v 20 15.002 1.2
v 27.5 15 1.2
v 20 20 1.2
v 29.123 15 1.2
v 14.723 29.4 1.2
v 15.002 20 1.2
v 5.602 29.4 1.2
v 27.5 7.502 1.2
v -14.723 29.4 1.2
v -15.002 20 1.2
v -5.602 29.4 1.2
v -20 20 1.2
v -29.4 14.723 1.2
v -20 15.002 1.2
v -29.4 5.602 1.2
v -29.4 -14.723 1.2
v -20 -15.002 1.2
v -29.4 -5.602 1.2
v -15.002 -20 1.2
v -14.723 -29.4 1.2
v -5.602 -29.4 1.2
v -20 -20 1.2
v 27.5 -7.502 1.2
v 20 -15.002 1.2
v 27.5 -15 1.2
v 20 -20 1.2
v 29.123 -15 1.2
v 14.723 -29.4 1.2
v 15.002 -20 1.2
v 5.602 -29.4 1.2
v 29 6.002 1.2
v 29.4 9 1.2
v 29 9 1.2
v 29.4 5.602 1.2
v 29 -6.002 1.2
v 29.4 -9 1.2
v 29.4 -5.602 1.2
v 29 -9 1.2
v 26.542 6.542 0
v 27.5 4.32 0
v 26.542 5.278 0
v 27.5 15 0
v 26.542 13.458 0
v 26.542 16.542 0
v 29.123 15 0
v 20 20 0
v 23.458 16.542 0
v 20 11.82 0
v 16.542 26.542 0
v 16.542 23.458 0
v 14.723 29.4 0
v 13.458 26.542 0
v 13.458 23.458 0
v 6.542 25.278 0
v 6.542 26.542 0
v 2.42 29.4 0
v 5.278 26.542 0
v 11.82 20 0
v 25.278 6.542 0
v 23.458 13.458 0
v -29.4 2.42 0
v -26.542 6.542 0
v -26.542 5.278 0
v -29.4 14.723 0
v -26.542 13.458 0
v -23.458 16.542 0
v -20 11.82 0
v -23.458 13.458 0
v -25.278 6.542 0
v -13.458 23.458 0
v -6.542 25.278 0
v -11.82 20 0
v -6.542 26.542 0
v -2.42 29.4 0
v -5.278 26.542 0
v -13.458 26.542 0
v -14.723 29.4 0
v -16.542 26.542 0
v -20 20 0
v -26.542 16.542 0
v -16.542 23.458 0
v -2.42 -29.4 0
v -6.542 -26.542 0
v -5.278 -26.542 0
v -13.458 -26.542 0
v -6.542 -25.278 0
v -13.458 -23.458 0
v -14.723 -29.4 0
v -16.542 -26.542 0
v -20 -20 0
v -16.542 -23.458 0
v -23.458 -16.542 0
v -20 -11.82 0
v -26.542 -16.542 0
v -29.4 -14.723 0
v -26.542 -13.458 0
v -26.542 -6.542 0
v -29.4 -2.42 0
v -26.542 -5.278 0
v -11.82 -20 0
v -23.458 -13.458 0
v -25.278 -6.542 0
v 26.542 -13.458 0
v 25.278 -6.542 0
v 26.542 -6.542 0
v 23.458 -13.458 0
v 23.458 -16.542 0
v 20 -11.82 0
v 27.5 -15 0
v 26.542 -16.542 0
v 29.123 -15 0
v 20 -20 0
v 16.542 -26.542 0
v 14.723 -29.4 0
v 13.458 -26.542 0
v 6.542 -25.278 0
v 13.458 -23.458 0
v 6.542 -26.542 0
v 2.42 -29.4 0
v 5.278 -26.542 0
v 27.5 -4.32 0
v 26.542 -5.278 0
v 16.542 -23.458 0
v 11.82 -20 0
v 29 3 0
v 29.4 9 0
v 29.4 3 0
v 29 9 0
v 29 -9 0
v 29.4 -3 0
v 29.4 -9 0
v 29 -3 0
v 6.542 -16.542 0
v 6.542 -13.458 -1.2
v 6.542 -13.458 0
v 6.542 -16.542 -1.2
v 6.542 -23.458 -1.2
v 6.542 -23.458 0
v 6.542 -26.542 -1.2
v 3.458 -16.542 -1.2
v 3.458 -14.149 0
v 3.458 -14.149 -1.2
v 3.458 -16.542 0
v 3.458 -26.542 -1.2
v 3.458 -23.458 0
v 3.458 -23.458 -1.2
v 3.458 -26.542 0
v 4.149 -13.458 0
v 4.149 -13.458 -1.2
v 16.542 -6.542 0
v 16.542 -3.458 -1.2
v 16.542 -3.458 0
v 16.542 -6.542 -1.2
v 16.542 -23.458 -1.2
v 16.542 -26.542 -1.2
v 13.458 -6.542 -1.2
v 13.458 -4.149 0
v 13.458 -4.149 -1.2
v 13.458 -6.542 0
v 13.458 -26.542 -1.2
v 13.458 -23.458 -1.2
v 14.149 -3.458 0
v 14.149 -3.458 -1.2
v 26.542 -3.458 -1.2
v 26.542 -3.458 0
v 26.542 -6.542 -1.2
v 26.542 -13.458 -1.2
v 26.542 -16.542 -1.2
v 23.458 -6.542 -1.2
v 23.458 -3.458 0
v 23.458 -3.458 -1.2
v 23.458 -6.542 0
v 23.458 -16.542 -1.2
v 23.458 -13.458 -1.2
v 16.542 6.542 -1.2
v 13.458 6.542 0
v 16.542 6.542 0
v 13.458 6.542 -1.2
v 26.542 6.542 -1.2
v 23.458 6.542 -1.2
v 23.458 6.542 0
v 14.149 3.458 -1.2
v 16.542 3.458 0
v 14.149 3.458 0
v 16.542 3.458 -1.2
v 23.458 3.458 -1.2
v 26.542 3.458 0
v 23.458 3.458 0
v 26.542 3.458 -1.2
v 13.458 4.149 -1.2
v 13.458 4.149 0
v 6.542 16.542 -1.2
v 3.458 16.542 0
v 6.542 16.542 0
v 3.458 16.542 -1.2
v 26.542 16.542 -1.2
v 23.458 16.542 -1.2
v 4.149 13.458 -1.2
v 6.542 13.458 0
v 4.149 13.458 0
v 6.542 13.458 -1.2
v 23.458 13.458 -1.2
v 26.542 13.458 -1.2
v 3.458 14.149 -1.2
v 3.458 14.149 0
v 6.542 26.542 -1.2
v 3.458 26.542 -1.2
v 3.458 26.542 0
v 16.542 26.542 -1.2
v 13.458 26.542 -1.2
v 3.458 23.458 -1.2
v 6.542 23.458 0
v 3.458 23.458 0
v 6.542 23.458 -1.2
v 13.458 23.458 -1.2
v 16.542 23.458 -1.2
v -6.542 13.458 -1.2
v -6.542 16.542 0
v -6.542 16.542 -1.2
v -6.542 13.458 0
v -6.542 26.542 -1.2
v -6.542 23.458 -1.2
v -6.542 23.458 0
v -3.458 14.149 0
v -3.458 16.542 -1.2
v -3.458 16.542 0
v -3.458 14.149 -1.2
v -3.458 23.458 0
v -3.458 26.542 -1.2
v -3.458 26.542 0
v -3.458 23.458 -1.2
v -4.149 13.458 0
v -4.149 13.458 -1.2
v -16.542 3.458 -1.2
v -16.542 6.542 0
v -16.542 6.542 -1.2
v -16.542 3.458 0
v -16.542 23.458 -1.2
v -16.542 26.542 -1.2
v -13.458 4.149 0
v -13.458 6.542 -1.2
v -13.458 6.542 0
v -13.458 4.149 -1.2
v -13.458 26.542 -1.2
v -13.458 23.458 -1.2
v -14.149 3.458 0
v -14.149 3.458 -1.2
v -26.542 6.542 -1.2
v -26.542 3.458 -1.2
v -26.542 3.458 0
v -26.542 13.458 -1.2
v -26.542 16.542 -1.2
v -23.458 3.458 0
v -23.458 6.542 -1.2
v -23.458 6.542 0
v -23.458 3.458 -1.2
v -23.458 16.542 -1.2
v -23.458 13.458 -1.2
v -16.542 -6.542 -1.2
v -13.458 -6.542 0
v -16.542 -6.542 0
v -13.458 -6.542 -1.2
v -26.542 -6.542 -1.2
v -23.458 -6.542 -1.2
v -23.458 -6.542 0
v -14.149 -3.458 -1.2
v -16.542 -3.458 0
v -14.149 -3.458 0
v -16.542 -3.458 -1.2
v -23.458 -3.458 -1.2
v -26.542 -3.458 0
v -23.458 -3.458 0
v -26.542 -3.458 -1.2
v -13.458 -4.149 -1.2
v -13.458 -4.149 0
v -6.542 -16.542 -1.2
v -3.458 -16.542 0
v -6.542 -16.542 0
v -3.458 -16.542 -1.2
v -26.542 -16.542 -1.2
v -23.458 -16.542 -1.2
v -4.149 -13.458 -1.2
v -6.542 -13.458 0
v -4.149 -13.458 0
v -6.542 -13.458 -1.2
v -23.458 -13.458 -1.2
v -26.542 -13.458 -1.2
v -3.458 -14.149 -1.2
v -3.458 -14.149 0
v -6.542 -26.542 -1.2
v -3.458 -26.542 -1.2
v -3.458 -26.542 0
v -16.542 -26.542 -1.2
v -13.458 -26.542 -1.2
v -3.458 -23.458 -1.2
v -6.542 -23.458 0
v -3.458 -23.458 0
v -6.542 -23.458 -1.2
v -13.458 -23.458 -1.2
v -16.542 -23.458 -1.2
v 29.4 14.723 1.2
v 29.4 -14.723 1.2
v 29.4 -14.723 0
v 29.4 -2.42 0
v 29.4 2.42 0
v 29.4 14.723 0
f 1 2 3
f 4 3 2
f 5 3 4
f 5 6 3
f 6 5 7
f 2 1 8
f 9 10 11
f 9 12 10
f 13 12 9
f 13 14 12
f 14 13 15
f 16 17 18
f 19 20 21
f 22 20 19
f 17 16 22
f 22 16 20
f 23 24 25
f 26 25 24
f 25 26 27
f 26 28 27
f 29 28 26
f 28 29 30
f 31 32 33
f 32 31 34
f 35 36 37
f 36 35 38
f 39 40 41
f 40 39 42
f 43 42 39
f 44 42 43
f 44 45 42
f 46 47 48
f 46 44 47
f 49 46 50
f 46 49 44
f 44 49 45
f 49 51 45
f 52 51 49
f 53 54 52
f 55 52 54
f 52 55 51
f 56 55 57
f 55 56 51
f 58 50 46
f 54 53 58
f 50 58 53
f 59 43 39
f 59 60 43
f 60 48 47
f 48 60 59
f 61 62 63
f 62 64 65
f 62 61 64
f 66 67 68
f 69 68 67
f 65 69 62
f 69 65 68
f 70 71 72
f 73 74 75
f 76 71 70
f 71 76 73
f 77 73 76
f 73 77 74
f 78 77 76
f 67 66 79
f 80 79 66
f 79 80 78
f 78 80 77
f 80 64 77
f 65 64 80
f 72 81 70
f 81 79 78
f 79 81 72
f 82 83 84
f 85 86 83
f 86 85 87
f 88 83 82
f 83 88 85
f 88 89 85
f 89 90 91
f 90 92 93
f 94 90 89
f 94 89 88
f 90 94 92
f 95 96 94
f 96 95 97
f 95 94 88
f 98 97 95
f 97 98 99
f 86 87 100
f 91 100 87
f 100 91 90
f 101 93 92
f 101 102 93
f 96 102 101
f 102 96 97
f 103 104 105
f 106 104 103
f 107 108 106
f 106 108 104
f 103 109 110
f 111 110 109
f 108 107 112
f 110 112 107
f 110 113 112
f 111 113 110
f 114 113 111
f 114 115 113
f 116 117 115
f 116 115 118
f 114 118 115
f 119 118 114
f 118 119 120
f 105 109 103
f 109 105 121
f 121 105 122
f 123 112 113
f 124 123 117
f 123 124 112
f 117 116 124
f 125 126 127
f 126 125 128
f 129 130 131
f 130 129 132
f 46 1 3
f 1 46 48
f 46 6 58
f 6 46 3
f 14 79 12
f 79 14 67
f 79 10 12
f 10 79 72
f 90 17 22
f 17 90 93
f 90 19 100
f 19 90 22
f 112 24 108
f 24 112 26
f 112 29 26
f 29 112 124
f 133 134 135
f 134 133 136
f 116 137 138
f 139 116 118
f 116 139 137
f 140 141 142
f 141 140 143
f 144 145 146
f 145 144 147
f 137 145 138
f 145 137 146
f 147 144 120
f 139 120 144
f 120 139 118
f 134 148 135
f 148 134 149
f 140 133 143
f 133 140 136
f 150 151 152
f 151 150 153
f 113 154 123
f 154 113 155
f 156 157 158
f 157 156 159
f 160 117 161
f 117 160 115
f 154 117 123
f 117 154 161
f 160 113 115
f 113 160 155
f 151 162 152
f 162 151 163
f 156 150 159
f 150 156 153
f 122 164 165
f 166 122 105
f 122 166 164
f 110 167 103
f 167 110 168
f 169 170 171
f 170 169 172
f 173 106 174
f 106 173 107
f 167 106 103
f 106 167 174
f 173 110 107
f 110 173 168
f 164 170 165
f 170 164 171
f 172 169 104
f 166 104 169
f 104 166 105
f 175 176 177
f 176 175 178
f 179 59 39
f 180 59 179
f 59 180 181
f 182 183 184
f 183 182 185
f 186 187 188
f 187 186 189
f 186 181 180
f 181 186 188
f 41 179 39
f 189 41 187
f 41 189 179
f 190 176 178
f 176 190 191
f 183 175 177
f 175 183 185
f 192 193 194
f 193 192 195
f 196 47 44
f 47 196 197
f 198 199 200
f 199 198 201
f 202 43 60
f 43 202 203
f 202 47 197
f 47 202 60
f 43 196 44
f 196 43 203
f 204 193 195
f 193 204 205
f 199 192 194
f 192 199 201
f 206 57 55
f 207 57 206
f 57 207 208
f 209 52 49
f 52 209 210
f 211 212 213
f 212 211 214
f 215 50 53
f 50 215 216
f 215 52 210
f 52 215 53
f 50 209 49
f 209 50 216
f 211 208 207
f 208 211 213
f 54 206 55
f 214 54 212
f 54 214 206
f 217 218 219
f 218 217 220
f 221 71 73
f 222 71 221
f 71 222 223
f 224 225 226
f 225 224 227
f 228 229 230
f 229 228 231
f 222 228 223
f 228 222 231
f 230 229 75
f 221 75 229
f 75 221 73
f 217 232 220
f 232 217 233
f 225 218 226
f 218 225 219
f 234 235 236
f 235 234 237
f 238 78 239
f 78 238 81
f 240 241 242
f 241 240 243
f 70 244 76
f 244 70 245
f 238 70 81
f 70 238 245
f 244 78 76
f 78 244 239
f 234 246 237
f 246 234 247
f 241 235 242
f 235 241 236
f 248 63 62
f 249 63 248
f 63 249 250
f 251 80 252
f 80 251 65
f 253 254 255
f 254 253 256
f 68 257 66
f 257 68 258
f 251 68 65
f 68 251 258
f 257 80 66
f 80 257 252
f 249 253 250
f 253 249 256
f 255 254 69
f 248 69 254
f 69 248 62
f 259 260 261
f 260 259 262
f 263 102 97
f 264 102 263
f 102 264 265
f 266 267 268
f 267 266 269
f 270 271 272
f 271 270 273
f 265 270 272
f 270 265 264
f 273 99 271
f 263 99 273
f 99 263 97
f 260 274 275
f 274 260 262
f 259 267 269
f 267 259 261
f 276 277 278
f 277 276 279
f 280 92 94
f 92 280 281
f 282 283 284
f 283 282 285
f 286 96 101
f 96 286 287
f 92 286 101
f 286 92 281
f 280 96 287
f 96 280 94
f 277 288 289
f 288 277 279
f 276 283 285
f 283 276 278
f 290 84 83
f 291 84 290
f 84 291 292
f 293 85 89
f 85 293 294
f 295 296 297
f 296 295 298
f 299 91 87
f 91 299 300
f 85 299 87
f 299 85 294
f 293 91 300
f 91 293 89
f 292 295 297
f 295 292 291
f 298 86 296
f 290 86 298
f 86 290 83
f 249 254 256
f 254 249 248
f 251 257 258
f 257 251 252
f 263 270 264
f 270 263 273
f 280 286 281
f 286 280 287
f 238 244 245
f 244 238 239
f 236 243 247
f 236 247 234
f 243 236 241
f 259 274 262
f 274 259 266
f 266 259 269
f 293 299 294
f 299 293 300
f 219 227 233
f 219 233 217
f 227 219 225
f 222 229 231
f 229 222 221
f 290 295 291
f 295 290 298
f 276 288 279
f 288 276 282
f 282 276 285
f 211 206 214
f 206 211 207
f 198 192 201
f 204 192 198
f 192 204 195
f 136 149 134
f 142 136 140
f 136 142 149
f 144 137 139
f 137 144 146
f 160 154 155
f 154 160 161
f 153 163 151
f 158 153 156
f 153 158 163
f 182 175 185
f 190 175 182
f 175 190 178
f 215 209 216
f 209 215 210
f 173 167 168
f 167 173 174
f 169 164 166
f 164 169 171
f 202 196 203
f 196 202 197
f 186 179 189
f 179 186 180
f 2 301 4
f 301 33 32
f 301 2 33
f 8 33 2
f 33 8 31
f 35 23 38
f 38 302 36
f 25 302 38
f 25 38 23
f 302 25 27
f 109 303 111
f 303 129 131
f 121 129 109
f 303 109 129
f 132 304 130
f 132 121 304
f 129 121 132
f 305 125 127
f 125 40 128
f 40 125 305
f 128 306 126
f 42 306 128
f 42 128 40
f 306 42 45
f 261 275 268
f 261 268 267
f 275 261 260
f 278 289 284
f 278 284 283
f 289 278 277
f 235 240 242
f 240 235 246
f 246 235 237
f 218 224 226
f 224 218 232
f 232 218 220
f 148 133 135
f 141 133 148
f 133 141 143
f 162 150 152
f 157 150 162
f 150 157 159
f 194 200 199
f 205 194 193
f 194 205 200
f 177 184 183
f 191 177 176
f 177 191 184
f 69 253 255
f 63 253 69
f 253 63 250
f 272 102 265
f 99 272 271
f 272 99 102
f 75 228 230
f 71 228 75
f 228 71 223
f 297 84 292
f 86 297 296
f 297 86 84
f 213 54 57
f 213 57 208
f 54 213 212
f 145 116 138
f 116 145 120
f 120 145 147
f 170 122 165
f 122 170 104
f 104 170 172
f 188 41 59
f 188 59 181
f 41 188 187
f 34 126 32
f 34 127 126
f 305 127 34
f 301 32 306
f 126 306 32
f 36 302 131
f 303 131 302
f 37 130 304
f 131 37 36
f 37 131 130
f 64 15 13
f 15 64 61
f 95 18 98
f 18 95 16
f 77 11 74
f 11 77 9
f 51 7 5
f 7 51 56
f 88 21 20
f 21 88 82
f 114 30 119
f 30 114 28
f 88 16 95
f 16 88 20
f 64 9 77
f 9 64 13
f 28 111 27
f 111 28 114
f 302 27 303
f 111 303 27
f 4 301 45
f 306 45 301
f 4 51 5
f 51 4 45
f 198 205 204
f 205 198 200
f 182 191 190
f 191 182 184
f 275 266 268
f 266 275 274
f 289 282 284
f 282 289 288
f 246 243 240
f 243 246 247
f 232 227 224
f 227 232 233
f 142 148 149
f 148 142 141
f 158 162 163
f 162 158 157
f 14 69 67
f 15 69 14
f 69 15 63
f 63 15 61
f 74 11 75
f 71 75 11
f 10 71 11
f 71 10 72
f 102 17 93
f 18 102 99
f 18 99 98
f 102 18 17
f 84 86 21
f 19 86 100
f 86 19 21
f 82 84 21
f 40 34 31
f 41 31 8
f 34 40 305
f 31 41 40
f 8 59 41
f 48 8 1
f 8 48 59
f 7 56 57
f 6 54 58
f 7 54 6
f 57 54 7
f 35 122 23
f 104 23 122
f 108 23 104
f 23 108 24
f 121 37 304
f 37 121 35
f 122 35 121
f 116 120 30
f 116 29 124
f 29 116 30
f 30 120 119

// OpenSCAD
//======================================================================
// Menger1.scad
//
// Menger sponge created by cutting up a large cube
//
// DrTomFlint 7 May 2025
//======================================================================

// Menger sponge created by cutting up a large cube


thick=1.2;    // plate thickness
Ztab=1.2;     // depth of tabs into menge

F2=55;

//----------------------------------------------------------------------
module menge(T=3,l=90){
  
  echo("Smallest cube is ", l/pow(3,T), " mm");


  //difference(){
  intersection(){

  // magic rotation 
  rotate([0,0,0])
  rotate([0,35.5,0])
  rotate([45,0,0])

  difference(){
    cube(l, center = true);
    
    cutz2();
    
    rotate([90,0,0])
    cutz2();
    
    rotate([0,90,0])
    cutz2();

  }

  // add a way to cut it
  //color("cyan")
  translate([0,0,1.0*l])
  cube(2*l, center=true);
  }
  
}

//----------------------------------------------------------------------
module box(T=3,l=90){
  
  echo("Smallest cube is ", l/pow(3,T), " mm");


  //difference(){
  intersection(){

  // magic rotation 
  rotate([0,0,0])
  rotate([0,35.5,0])
  rotate([45,0,0])

  difference(){
    cube(l, center = true);
    
    //~ cutz2();
    
    //~ rotate([90,0,0])
    //~ cutz2();
    
    //~ rotate([0,90,0])
    //~ cutz2();

  }

  // add a way to cut it
  //color("cyan")
  translate([0,0,1.0*l])
  cube(2*l, center=true);
  }
  
}
//----------------------------------------------------------------------
module cuts(T=3,l=90){
  
  echo("Smallest cube is ", l/pow(3,T), " mm");


  //difference(){
  intersection(){

  // magic rotation 
  rotate([0,0,0])
  rotate([0,35.5,0])
  rotate([45,0,0]){

    cutz2(tol=-0.25);
    
    rotate([90,0,0])
    cutz2(tol=-0.25);
    
    rotate([0,90,0])
    cutz2(tol=-0.25);
  }

  // add a way to cut it
  //color("cyan")
  translate([0,0,1.0*l])
  cube(2*l, center=true);
  }
  
}

//----------------------------------------------------------------------
module box8a(){
  translate([l/2,-l/2,l/2])
  rotate([-45,0,0])
  rotate([0,-35.5,0])
  difference(){
    //~ box(T=T,l=l);
    menge(T=T,l=l);
    translate([0,0,66]) cube([400,400,100],center=true);
  }
}

//----------------------------------------------------------------------
module box8(){

  // lowers 4
  translate([0,0,-l])
  for(i=[0:3])
  rotate([0,0,i*90])
  box8a();
  
  // upper 4
  //~ translate([0,0,l])
  //~ for(i=[0:3])
  //~ rotate([0,0,i*90])
  //~ rotate([0,180,0])
  //~ box8a();
  
}

//----------------------------------------------------------------------
module cuts8a(){
  translate([l/2,-l/2,l/2])
  rotate([-45,0,0])
  rotate([0,-35.5,0])
  difference(){
    //~ box(T=T,l=l);
    cuts(T=T,l=l);
    translate([0,0,66]) cube([400,400,100],center=true);
  }
}
//----------------------------------------------------------------------
module cuts8(){

  // lowers 4
  translate([0,0,-l])
  for(i=[0:3])
  rotate([0,0,i*90])
  cuts8a();
  
  //~ // upper 4
  //~ translate([0,0,l+2*thick])
  //~ for(i=[0:3])
  //~ rotate([0,0,i*90])
  //~ rotate([0,180,0])
  //~ cuts8a();
  
}

//----------------------------------------------------------------------
module boxIn(tol=0){

s1=0.575*l-tol;
s2=0.575*l-tol;

  translate([0,0,0])
  rotate([180,0,0])
  cylinder(r1=s1,r2=0.01,h=s2,$fn=4);
  translate([0,0,0])
  cylinder(r1=s1,r2=0.01,h=s2,$fn=4);
}

//----------------------------------------------------------------------
module cutz2(tol=0){

  for (k = [0:T]) {
    w = l/pow(3,k);
    
    for (x = [(-l/2)+1.5*w:3*w:(l/2)-w], y = [(-l/2)+1.5*w:3*w:(l/2)-w]) {
      translate([x,y,0])cube([w+tol,w+tol,l+1],center=true);
    }
  
  }
}


//----------------------------------------------------------------------
module plate(tol=0){


  difference(){
    translate([0,0,thick/2])
    intersection(){
      cube([2*l,2*l,thick],center=true);
      rotate([0,0,45])
      cube([2.12*l,2.12*l,thick],center=true);
    }
    // recut the 4 largest
    translate([l/2,l/2,0])
    cube([l/3,l/3,20],center=true);
    translate([-l/2,l/2,0])
    cube([l/3,l/3,20],center=true);
    translate([-l/2,-l/2,0])
    cube([l/3,l/3,20],center=true);
    translate([l/2,-l/2,0])
    cube([l/3,l/3,20],center=true);
    
    // central cavity
    translate([0,0,thick/2])
    rotate([0,0,45])
    cube([0.75*l,0.75*l,3*thick],center=true);
  }
  
  difference(){
    cuts8();
    translate([0,0,-Ztab-l])
    cube([4*l,4*l,2*l],center=true);
    // recut the 4 largest
    translate([l/2,l/2,0])
    cube([l/3,l/3,20],center=true);
    translate([-l/2,l/2,0])
    cube([l/3,l/3,20],center=true);
    translate([-l/2,-l/2,0])
    cube([l/3,l/3,20],center=true);
    translate([l/2,-l/2,0])
    cube([l/3,l/3,20],center=true);
  }
  
  difference(){
    boxIn(tol=0.1);
    translate([0,0,thick])
    boxIn(tol=0.1);
  }
  
  // hinge
  difference(){
    union(){
      translate([l+2,0,-thick+0.4])
      rotate([90,0,0])
      cylinder(r=2,h=l,center=true,$fn=F2);
      translate([l,0,thick/2])
      cube([5,l,thick],center=true);
    }
    translate([l+4,l/5,thick/2])
    cube([10,l/5,6*thick],center=true);    
    translate([l+4,-l/5,thick/2])
    cube([10,l/5,6*thick],center=true);    
    translate([l+2,0,-thick+0.4])
    rotate([90,0,0])
    cylinder(r=1,h=l+2,center=true,$fn=F2);

    translate([l+8,l/2+6,-thick+0.4])
    rotate([0,0,45])
    cube([20,20,20],center=true);    
    translate([l+8,-l/2-6,-thick+0.4])
    rotate([0,0,45])
    cube([20,20,20],center=true);    
  }
}

//----------------------------------------------------------------------
module hinge(tol=0.2){

Zoff=3.5*thick;

  difference(){
    hull(){
      translate([l+2,l/5,-thick+0.4])
      rotate([90,0,0])
      cylinder(r=2,h=l/5-tol,center=true,$fn=F2);
      
      translate([l+2,l/5,-thick+0.4+Zoff])
      rotate([90,0,0])
      cylinder(r=2,h=l/5-tol,center=true,$fn=F2);
    }
    
    translate([l+2,0,-thick+0.4])
    rotate([90,0,0])
    cylinder(r=1,h=l+2,center=true,$fn=F2);
    translate([l+2,0,-thick+0.4+Zoff])
    rotate([90,0,0])
    cylinder(r=1,h=l+2,center=true,$fn=F2);
  }

}

//----------------------------------------------------------------------
module plateA(tol=0){

  difference(){
    plate();
    translate([0,0,thick/2])
    intersection(){
      cube([2*l-thick,2*l-thick,4*l],center=true);
      rotate([0,0,45])
      cube([2.12*l-thick,2.12*l-thick,4*l],center=true);
    }
  }
}

//----------------------------------------------------------------------
module plateB(tol=0){

difference(){
  intersection(){
    plate();
    translate([0,0,thick/2])
    intersection(){
      cube([2*l-thick,2*l-thick,4*l],center=true);
      rotate([0,0,45])
      cube([2.12*l-thick,2.12*l-thick,4*l],center=true);
    }
  }
  rotate([0,0,45])
  cube([0.75*l,0.75*l,2*l],center=true);
}

}

//----------------------------------------------------------------------
module plateB2(tol=0){

difference(){
  intersection(){
    plate();
    translate([0,0,thick/2])
    intersection(){
      cube([2*l-thick,2*l-thick,4*l],center=true);
      rotate([0,0,45])
      cube([2.12*l-thick,2.12*l-thick,4*l],center=true);
    }
  }
  rotate([0,0,45])
  cube([0.75*l+2*thick,0.75*l+2*thick,2*l],center=true);

  rotate([0,0,45])
  linear_extrude(height=thick,scale=1.1)
  square([0.75*l+2*thick,0.75*l+2*thick],center=true);
}

}

//----------------------------------------------------------------------
module plateB2a(tol=0){

  difference(){
    plateB2();
    rotate([0,0,45])
    linear_extrude(height=thick,scale=1.1)
    square([1.5*l,1.5*l],center=true);
  }

}

//----------------------------------------------------------------------
module plateB2b(tol=0){

  difference(){
    intersection(){
      plateB2();
      rotate([0,0,45])
      linear_extrude(height=thick,scale=1.1)
      square([1.5*l,1.5*l],center=true);
    }
    rotate([0,0,45])
    linear_extrude(height=thick,scale=1.1)
    square([1.1*l,1.1*l],center=true);
  }
}

//----------------------------------------------------------------------
module plateB2c(tol=0){


  intersection(){
    plateB2();
    rotate([0,0,45])
    linear_extrude(height=thick,scale=1.1)
    square([1.1*l,1.1*l],center=true);
  }
}

//----------------------------------------------------------------------
module plateC(tol=0){

  intersection(){
    plate();
    rotate([0,0,45])
    cube([0.75*l,0.75*l,2*l],center=true);
  }
  
}

//======================================================================

// Order
T=2; l=30;
//~ T=3; l=90;
//~ T=4; l=270;

//~ menge(T=T,l=l);

//~ cutz2();


// remove top for 8-ball construction
//~ difference(){
//~ menge(T=T,l=l);
//~ translate([0,0,66]) cube([400,400,100],center=true);
//~ }



// tests for internal space
//~ box8();

//~ boxIn(tol=0.4);

//~ plate();

// cut up plate for multi-color prints
//~ plateA();     // outer rim and hinge
//~ plateB();     // inner flat
//~ plateB2();     // inner flat

plateB2a();     // inner flat
//~ plateB2b();     // inner flat
//~ plateB2c();     // inner flat

//~ plateC();     // pyramid tent

//~ translate([0,0,2*thick+0.2])
//~ rotate([180,0,0])
//~ plate();


//~ hinge();

//~ cuts8a();
//~ box8a();

//~ cuts8();


//======================================================================
